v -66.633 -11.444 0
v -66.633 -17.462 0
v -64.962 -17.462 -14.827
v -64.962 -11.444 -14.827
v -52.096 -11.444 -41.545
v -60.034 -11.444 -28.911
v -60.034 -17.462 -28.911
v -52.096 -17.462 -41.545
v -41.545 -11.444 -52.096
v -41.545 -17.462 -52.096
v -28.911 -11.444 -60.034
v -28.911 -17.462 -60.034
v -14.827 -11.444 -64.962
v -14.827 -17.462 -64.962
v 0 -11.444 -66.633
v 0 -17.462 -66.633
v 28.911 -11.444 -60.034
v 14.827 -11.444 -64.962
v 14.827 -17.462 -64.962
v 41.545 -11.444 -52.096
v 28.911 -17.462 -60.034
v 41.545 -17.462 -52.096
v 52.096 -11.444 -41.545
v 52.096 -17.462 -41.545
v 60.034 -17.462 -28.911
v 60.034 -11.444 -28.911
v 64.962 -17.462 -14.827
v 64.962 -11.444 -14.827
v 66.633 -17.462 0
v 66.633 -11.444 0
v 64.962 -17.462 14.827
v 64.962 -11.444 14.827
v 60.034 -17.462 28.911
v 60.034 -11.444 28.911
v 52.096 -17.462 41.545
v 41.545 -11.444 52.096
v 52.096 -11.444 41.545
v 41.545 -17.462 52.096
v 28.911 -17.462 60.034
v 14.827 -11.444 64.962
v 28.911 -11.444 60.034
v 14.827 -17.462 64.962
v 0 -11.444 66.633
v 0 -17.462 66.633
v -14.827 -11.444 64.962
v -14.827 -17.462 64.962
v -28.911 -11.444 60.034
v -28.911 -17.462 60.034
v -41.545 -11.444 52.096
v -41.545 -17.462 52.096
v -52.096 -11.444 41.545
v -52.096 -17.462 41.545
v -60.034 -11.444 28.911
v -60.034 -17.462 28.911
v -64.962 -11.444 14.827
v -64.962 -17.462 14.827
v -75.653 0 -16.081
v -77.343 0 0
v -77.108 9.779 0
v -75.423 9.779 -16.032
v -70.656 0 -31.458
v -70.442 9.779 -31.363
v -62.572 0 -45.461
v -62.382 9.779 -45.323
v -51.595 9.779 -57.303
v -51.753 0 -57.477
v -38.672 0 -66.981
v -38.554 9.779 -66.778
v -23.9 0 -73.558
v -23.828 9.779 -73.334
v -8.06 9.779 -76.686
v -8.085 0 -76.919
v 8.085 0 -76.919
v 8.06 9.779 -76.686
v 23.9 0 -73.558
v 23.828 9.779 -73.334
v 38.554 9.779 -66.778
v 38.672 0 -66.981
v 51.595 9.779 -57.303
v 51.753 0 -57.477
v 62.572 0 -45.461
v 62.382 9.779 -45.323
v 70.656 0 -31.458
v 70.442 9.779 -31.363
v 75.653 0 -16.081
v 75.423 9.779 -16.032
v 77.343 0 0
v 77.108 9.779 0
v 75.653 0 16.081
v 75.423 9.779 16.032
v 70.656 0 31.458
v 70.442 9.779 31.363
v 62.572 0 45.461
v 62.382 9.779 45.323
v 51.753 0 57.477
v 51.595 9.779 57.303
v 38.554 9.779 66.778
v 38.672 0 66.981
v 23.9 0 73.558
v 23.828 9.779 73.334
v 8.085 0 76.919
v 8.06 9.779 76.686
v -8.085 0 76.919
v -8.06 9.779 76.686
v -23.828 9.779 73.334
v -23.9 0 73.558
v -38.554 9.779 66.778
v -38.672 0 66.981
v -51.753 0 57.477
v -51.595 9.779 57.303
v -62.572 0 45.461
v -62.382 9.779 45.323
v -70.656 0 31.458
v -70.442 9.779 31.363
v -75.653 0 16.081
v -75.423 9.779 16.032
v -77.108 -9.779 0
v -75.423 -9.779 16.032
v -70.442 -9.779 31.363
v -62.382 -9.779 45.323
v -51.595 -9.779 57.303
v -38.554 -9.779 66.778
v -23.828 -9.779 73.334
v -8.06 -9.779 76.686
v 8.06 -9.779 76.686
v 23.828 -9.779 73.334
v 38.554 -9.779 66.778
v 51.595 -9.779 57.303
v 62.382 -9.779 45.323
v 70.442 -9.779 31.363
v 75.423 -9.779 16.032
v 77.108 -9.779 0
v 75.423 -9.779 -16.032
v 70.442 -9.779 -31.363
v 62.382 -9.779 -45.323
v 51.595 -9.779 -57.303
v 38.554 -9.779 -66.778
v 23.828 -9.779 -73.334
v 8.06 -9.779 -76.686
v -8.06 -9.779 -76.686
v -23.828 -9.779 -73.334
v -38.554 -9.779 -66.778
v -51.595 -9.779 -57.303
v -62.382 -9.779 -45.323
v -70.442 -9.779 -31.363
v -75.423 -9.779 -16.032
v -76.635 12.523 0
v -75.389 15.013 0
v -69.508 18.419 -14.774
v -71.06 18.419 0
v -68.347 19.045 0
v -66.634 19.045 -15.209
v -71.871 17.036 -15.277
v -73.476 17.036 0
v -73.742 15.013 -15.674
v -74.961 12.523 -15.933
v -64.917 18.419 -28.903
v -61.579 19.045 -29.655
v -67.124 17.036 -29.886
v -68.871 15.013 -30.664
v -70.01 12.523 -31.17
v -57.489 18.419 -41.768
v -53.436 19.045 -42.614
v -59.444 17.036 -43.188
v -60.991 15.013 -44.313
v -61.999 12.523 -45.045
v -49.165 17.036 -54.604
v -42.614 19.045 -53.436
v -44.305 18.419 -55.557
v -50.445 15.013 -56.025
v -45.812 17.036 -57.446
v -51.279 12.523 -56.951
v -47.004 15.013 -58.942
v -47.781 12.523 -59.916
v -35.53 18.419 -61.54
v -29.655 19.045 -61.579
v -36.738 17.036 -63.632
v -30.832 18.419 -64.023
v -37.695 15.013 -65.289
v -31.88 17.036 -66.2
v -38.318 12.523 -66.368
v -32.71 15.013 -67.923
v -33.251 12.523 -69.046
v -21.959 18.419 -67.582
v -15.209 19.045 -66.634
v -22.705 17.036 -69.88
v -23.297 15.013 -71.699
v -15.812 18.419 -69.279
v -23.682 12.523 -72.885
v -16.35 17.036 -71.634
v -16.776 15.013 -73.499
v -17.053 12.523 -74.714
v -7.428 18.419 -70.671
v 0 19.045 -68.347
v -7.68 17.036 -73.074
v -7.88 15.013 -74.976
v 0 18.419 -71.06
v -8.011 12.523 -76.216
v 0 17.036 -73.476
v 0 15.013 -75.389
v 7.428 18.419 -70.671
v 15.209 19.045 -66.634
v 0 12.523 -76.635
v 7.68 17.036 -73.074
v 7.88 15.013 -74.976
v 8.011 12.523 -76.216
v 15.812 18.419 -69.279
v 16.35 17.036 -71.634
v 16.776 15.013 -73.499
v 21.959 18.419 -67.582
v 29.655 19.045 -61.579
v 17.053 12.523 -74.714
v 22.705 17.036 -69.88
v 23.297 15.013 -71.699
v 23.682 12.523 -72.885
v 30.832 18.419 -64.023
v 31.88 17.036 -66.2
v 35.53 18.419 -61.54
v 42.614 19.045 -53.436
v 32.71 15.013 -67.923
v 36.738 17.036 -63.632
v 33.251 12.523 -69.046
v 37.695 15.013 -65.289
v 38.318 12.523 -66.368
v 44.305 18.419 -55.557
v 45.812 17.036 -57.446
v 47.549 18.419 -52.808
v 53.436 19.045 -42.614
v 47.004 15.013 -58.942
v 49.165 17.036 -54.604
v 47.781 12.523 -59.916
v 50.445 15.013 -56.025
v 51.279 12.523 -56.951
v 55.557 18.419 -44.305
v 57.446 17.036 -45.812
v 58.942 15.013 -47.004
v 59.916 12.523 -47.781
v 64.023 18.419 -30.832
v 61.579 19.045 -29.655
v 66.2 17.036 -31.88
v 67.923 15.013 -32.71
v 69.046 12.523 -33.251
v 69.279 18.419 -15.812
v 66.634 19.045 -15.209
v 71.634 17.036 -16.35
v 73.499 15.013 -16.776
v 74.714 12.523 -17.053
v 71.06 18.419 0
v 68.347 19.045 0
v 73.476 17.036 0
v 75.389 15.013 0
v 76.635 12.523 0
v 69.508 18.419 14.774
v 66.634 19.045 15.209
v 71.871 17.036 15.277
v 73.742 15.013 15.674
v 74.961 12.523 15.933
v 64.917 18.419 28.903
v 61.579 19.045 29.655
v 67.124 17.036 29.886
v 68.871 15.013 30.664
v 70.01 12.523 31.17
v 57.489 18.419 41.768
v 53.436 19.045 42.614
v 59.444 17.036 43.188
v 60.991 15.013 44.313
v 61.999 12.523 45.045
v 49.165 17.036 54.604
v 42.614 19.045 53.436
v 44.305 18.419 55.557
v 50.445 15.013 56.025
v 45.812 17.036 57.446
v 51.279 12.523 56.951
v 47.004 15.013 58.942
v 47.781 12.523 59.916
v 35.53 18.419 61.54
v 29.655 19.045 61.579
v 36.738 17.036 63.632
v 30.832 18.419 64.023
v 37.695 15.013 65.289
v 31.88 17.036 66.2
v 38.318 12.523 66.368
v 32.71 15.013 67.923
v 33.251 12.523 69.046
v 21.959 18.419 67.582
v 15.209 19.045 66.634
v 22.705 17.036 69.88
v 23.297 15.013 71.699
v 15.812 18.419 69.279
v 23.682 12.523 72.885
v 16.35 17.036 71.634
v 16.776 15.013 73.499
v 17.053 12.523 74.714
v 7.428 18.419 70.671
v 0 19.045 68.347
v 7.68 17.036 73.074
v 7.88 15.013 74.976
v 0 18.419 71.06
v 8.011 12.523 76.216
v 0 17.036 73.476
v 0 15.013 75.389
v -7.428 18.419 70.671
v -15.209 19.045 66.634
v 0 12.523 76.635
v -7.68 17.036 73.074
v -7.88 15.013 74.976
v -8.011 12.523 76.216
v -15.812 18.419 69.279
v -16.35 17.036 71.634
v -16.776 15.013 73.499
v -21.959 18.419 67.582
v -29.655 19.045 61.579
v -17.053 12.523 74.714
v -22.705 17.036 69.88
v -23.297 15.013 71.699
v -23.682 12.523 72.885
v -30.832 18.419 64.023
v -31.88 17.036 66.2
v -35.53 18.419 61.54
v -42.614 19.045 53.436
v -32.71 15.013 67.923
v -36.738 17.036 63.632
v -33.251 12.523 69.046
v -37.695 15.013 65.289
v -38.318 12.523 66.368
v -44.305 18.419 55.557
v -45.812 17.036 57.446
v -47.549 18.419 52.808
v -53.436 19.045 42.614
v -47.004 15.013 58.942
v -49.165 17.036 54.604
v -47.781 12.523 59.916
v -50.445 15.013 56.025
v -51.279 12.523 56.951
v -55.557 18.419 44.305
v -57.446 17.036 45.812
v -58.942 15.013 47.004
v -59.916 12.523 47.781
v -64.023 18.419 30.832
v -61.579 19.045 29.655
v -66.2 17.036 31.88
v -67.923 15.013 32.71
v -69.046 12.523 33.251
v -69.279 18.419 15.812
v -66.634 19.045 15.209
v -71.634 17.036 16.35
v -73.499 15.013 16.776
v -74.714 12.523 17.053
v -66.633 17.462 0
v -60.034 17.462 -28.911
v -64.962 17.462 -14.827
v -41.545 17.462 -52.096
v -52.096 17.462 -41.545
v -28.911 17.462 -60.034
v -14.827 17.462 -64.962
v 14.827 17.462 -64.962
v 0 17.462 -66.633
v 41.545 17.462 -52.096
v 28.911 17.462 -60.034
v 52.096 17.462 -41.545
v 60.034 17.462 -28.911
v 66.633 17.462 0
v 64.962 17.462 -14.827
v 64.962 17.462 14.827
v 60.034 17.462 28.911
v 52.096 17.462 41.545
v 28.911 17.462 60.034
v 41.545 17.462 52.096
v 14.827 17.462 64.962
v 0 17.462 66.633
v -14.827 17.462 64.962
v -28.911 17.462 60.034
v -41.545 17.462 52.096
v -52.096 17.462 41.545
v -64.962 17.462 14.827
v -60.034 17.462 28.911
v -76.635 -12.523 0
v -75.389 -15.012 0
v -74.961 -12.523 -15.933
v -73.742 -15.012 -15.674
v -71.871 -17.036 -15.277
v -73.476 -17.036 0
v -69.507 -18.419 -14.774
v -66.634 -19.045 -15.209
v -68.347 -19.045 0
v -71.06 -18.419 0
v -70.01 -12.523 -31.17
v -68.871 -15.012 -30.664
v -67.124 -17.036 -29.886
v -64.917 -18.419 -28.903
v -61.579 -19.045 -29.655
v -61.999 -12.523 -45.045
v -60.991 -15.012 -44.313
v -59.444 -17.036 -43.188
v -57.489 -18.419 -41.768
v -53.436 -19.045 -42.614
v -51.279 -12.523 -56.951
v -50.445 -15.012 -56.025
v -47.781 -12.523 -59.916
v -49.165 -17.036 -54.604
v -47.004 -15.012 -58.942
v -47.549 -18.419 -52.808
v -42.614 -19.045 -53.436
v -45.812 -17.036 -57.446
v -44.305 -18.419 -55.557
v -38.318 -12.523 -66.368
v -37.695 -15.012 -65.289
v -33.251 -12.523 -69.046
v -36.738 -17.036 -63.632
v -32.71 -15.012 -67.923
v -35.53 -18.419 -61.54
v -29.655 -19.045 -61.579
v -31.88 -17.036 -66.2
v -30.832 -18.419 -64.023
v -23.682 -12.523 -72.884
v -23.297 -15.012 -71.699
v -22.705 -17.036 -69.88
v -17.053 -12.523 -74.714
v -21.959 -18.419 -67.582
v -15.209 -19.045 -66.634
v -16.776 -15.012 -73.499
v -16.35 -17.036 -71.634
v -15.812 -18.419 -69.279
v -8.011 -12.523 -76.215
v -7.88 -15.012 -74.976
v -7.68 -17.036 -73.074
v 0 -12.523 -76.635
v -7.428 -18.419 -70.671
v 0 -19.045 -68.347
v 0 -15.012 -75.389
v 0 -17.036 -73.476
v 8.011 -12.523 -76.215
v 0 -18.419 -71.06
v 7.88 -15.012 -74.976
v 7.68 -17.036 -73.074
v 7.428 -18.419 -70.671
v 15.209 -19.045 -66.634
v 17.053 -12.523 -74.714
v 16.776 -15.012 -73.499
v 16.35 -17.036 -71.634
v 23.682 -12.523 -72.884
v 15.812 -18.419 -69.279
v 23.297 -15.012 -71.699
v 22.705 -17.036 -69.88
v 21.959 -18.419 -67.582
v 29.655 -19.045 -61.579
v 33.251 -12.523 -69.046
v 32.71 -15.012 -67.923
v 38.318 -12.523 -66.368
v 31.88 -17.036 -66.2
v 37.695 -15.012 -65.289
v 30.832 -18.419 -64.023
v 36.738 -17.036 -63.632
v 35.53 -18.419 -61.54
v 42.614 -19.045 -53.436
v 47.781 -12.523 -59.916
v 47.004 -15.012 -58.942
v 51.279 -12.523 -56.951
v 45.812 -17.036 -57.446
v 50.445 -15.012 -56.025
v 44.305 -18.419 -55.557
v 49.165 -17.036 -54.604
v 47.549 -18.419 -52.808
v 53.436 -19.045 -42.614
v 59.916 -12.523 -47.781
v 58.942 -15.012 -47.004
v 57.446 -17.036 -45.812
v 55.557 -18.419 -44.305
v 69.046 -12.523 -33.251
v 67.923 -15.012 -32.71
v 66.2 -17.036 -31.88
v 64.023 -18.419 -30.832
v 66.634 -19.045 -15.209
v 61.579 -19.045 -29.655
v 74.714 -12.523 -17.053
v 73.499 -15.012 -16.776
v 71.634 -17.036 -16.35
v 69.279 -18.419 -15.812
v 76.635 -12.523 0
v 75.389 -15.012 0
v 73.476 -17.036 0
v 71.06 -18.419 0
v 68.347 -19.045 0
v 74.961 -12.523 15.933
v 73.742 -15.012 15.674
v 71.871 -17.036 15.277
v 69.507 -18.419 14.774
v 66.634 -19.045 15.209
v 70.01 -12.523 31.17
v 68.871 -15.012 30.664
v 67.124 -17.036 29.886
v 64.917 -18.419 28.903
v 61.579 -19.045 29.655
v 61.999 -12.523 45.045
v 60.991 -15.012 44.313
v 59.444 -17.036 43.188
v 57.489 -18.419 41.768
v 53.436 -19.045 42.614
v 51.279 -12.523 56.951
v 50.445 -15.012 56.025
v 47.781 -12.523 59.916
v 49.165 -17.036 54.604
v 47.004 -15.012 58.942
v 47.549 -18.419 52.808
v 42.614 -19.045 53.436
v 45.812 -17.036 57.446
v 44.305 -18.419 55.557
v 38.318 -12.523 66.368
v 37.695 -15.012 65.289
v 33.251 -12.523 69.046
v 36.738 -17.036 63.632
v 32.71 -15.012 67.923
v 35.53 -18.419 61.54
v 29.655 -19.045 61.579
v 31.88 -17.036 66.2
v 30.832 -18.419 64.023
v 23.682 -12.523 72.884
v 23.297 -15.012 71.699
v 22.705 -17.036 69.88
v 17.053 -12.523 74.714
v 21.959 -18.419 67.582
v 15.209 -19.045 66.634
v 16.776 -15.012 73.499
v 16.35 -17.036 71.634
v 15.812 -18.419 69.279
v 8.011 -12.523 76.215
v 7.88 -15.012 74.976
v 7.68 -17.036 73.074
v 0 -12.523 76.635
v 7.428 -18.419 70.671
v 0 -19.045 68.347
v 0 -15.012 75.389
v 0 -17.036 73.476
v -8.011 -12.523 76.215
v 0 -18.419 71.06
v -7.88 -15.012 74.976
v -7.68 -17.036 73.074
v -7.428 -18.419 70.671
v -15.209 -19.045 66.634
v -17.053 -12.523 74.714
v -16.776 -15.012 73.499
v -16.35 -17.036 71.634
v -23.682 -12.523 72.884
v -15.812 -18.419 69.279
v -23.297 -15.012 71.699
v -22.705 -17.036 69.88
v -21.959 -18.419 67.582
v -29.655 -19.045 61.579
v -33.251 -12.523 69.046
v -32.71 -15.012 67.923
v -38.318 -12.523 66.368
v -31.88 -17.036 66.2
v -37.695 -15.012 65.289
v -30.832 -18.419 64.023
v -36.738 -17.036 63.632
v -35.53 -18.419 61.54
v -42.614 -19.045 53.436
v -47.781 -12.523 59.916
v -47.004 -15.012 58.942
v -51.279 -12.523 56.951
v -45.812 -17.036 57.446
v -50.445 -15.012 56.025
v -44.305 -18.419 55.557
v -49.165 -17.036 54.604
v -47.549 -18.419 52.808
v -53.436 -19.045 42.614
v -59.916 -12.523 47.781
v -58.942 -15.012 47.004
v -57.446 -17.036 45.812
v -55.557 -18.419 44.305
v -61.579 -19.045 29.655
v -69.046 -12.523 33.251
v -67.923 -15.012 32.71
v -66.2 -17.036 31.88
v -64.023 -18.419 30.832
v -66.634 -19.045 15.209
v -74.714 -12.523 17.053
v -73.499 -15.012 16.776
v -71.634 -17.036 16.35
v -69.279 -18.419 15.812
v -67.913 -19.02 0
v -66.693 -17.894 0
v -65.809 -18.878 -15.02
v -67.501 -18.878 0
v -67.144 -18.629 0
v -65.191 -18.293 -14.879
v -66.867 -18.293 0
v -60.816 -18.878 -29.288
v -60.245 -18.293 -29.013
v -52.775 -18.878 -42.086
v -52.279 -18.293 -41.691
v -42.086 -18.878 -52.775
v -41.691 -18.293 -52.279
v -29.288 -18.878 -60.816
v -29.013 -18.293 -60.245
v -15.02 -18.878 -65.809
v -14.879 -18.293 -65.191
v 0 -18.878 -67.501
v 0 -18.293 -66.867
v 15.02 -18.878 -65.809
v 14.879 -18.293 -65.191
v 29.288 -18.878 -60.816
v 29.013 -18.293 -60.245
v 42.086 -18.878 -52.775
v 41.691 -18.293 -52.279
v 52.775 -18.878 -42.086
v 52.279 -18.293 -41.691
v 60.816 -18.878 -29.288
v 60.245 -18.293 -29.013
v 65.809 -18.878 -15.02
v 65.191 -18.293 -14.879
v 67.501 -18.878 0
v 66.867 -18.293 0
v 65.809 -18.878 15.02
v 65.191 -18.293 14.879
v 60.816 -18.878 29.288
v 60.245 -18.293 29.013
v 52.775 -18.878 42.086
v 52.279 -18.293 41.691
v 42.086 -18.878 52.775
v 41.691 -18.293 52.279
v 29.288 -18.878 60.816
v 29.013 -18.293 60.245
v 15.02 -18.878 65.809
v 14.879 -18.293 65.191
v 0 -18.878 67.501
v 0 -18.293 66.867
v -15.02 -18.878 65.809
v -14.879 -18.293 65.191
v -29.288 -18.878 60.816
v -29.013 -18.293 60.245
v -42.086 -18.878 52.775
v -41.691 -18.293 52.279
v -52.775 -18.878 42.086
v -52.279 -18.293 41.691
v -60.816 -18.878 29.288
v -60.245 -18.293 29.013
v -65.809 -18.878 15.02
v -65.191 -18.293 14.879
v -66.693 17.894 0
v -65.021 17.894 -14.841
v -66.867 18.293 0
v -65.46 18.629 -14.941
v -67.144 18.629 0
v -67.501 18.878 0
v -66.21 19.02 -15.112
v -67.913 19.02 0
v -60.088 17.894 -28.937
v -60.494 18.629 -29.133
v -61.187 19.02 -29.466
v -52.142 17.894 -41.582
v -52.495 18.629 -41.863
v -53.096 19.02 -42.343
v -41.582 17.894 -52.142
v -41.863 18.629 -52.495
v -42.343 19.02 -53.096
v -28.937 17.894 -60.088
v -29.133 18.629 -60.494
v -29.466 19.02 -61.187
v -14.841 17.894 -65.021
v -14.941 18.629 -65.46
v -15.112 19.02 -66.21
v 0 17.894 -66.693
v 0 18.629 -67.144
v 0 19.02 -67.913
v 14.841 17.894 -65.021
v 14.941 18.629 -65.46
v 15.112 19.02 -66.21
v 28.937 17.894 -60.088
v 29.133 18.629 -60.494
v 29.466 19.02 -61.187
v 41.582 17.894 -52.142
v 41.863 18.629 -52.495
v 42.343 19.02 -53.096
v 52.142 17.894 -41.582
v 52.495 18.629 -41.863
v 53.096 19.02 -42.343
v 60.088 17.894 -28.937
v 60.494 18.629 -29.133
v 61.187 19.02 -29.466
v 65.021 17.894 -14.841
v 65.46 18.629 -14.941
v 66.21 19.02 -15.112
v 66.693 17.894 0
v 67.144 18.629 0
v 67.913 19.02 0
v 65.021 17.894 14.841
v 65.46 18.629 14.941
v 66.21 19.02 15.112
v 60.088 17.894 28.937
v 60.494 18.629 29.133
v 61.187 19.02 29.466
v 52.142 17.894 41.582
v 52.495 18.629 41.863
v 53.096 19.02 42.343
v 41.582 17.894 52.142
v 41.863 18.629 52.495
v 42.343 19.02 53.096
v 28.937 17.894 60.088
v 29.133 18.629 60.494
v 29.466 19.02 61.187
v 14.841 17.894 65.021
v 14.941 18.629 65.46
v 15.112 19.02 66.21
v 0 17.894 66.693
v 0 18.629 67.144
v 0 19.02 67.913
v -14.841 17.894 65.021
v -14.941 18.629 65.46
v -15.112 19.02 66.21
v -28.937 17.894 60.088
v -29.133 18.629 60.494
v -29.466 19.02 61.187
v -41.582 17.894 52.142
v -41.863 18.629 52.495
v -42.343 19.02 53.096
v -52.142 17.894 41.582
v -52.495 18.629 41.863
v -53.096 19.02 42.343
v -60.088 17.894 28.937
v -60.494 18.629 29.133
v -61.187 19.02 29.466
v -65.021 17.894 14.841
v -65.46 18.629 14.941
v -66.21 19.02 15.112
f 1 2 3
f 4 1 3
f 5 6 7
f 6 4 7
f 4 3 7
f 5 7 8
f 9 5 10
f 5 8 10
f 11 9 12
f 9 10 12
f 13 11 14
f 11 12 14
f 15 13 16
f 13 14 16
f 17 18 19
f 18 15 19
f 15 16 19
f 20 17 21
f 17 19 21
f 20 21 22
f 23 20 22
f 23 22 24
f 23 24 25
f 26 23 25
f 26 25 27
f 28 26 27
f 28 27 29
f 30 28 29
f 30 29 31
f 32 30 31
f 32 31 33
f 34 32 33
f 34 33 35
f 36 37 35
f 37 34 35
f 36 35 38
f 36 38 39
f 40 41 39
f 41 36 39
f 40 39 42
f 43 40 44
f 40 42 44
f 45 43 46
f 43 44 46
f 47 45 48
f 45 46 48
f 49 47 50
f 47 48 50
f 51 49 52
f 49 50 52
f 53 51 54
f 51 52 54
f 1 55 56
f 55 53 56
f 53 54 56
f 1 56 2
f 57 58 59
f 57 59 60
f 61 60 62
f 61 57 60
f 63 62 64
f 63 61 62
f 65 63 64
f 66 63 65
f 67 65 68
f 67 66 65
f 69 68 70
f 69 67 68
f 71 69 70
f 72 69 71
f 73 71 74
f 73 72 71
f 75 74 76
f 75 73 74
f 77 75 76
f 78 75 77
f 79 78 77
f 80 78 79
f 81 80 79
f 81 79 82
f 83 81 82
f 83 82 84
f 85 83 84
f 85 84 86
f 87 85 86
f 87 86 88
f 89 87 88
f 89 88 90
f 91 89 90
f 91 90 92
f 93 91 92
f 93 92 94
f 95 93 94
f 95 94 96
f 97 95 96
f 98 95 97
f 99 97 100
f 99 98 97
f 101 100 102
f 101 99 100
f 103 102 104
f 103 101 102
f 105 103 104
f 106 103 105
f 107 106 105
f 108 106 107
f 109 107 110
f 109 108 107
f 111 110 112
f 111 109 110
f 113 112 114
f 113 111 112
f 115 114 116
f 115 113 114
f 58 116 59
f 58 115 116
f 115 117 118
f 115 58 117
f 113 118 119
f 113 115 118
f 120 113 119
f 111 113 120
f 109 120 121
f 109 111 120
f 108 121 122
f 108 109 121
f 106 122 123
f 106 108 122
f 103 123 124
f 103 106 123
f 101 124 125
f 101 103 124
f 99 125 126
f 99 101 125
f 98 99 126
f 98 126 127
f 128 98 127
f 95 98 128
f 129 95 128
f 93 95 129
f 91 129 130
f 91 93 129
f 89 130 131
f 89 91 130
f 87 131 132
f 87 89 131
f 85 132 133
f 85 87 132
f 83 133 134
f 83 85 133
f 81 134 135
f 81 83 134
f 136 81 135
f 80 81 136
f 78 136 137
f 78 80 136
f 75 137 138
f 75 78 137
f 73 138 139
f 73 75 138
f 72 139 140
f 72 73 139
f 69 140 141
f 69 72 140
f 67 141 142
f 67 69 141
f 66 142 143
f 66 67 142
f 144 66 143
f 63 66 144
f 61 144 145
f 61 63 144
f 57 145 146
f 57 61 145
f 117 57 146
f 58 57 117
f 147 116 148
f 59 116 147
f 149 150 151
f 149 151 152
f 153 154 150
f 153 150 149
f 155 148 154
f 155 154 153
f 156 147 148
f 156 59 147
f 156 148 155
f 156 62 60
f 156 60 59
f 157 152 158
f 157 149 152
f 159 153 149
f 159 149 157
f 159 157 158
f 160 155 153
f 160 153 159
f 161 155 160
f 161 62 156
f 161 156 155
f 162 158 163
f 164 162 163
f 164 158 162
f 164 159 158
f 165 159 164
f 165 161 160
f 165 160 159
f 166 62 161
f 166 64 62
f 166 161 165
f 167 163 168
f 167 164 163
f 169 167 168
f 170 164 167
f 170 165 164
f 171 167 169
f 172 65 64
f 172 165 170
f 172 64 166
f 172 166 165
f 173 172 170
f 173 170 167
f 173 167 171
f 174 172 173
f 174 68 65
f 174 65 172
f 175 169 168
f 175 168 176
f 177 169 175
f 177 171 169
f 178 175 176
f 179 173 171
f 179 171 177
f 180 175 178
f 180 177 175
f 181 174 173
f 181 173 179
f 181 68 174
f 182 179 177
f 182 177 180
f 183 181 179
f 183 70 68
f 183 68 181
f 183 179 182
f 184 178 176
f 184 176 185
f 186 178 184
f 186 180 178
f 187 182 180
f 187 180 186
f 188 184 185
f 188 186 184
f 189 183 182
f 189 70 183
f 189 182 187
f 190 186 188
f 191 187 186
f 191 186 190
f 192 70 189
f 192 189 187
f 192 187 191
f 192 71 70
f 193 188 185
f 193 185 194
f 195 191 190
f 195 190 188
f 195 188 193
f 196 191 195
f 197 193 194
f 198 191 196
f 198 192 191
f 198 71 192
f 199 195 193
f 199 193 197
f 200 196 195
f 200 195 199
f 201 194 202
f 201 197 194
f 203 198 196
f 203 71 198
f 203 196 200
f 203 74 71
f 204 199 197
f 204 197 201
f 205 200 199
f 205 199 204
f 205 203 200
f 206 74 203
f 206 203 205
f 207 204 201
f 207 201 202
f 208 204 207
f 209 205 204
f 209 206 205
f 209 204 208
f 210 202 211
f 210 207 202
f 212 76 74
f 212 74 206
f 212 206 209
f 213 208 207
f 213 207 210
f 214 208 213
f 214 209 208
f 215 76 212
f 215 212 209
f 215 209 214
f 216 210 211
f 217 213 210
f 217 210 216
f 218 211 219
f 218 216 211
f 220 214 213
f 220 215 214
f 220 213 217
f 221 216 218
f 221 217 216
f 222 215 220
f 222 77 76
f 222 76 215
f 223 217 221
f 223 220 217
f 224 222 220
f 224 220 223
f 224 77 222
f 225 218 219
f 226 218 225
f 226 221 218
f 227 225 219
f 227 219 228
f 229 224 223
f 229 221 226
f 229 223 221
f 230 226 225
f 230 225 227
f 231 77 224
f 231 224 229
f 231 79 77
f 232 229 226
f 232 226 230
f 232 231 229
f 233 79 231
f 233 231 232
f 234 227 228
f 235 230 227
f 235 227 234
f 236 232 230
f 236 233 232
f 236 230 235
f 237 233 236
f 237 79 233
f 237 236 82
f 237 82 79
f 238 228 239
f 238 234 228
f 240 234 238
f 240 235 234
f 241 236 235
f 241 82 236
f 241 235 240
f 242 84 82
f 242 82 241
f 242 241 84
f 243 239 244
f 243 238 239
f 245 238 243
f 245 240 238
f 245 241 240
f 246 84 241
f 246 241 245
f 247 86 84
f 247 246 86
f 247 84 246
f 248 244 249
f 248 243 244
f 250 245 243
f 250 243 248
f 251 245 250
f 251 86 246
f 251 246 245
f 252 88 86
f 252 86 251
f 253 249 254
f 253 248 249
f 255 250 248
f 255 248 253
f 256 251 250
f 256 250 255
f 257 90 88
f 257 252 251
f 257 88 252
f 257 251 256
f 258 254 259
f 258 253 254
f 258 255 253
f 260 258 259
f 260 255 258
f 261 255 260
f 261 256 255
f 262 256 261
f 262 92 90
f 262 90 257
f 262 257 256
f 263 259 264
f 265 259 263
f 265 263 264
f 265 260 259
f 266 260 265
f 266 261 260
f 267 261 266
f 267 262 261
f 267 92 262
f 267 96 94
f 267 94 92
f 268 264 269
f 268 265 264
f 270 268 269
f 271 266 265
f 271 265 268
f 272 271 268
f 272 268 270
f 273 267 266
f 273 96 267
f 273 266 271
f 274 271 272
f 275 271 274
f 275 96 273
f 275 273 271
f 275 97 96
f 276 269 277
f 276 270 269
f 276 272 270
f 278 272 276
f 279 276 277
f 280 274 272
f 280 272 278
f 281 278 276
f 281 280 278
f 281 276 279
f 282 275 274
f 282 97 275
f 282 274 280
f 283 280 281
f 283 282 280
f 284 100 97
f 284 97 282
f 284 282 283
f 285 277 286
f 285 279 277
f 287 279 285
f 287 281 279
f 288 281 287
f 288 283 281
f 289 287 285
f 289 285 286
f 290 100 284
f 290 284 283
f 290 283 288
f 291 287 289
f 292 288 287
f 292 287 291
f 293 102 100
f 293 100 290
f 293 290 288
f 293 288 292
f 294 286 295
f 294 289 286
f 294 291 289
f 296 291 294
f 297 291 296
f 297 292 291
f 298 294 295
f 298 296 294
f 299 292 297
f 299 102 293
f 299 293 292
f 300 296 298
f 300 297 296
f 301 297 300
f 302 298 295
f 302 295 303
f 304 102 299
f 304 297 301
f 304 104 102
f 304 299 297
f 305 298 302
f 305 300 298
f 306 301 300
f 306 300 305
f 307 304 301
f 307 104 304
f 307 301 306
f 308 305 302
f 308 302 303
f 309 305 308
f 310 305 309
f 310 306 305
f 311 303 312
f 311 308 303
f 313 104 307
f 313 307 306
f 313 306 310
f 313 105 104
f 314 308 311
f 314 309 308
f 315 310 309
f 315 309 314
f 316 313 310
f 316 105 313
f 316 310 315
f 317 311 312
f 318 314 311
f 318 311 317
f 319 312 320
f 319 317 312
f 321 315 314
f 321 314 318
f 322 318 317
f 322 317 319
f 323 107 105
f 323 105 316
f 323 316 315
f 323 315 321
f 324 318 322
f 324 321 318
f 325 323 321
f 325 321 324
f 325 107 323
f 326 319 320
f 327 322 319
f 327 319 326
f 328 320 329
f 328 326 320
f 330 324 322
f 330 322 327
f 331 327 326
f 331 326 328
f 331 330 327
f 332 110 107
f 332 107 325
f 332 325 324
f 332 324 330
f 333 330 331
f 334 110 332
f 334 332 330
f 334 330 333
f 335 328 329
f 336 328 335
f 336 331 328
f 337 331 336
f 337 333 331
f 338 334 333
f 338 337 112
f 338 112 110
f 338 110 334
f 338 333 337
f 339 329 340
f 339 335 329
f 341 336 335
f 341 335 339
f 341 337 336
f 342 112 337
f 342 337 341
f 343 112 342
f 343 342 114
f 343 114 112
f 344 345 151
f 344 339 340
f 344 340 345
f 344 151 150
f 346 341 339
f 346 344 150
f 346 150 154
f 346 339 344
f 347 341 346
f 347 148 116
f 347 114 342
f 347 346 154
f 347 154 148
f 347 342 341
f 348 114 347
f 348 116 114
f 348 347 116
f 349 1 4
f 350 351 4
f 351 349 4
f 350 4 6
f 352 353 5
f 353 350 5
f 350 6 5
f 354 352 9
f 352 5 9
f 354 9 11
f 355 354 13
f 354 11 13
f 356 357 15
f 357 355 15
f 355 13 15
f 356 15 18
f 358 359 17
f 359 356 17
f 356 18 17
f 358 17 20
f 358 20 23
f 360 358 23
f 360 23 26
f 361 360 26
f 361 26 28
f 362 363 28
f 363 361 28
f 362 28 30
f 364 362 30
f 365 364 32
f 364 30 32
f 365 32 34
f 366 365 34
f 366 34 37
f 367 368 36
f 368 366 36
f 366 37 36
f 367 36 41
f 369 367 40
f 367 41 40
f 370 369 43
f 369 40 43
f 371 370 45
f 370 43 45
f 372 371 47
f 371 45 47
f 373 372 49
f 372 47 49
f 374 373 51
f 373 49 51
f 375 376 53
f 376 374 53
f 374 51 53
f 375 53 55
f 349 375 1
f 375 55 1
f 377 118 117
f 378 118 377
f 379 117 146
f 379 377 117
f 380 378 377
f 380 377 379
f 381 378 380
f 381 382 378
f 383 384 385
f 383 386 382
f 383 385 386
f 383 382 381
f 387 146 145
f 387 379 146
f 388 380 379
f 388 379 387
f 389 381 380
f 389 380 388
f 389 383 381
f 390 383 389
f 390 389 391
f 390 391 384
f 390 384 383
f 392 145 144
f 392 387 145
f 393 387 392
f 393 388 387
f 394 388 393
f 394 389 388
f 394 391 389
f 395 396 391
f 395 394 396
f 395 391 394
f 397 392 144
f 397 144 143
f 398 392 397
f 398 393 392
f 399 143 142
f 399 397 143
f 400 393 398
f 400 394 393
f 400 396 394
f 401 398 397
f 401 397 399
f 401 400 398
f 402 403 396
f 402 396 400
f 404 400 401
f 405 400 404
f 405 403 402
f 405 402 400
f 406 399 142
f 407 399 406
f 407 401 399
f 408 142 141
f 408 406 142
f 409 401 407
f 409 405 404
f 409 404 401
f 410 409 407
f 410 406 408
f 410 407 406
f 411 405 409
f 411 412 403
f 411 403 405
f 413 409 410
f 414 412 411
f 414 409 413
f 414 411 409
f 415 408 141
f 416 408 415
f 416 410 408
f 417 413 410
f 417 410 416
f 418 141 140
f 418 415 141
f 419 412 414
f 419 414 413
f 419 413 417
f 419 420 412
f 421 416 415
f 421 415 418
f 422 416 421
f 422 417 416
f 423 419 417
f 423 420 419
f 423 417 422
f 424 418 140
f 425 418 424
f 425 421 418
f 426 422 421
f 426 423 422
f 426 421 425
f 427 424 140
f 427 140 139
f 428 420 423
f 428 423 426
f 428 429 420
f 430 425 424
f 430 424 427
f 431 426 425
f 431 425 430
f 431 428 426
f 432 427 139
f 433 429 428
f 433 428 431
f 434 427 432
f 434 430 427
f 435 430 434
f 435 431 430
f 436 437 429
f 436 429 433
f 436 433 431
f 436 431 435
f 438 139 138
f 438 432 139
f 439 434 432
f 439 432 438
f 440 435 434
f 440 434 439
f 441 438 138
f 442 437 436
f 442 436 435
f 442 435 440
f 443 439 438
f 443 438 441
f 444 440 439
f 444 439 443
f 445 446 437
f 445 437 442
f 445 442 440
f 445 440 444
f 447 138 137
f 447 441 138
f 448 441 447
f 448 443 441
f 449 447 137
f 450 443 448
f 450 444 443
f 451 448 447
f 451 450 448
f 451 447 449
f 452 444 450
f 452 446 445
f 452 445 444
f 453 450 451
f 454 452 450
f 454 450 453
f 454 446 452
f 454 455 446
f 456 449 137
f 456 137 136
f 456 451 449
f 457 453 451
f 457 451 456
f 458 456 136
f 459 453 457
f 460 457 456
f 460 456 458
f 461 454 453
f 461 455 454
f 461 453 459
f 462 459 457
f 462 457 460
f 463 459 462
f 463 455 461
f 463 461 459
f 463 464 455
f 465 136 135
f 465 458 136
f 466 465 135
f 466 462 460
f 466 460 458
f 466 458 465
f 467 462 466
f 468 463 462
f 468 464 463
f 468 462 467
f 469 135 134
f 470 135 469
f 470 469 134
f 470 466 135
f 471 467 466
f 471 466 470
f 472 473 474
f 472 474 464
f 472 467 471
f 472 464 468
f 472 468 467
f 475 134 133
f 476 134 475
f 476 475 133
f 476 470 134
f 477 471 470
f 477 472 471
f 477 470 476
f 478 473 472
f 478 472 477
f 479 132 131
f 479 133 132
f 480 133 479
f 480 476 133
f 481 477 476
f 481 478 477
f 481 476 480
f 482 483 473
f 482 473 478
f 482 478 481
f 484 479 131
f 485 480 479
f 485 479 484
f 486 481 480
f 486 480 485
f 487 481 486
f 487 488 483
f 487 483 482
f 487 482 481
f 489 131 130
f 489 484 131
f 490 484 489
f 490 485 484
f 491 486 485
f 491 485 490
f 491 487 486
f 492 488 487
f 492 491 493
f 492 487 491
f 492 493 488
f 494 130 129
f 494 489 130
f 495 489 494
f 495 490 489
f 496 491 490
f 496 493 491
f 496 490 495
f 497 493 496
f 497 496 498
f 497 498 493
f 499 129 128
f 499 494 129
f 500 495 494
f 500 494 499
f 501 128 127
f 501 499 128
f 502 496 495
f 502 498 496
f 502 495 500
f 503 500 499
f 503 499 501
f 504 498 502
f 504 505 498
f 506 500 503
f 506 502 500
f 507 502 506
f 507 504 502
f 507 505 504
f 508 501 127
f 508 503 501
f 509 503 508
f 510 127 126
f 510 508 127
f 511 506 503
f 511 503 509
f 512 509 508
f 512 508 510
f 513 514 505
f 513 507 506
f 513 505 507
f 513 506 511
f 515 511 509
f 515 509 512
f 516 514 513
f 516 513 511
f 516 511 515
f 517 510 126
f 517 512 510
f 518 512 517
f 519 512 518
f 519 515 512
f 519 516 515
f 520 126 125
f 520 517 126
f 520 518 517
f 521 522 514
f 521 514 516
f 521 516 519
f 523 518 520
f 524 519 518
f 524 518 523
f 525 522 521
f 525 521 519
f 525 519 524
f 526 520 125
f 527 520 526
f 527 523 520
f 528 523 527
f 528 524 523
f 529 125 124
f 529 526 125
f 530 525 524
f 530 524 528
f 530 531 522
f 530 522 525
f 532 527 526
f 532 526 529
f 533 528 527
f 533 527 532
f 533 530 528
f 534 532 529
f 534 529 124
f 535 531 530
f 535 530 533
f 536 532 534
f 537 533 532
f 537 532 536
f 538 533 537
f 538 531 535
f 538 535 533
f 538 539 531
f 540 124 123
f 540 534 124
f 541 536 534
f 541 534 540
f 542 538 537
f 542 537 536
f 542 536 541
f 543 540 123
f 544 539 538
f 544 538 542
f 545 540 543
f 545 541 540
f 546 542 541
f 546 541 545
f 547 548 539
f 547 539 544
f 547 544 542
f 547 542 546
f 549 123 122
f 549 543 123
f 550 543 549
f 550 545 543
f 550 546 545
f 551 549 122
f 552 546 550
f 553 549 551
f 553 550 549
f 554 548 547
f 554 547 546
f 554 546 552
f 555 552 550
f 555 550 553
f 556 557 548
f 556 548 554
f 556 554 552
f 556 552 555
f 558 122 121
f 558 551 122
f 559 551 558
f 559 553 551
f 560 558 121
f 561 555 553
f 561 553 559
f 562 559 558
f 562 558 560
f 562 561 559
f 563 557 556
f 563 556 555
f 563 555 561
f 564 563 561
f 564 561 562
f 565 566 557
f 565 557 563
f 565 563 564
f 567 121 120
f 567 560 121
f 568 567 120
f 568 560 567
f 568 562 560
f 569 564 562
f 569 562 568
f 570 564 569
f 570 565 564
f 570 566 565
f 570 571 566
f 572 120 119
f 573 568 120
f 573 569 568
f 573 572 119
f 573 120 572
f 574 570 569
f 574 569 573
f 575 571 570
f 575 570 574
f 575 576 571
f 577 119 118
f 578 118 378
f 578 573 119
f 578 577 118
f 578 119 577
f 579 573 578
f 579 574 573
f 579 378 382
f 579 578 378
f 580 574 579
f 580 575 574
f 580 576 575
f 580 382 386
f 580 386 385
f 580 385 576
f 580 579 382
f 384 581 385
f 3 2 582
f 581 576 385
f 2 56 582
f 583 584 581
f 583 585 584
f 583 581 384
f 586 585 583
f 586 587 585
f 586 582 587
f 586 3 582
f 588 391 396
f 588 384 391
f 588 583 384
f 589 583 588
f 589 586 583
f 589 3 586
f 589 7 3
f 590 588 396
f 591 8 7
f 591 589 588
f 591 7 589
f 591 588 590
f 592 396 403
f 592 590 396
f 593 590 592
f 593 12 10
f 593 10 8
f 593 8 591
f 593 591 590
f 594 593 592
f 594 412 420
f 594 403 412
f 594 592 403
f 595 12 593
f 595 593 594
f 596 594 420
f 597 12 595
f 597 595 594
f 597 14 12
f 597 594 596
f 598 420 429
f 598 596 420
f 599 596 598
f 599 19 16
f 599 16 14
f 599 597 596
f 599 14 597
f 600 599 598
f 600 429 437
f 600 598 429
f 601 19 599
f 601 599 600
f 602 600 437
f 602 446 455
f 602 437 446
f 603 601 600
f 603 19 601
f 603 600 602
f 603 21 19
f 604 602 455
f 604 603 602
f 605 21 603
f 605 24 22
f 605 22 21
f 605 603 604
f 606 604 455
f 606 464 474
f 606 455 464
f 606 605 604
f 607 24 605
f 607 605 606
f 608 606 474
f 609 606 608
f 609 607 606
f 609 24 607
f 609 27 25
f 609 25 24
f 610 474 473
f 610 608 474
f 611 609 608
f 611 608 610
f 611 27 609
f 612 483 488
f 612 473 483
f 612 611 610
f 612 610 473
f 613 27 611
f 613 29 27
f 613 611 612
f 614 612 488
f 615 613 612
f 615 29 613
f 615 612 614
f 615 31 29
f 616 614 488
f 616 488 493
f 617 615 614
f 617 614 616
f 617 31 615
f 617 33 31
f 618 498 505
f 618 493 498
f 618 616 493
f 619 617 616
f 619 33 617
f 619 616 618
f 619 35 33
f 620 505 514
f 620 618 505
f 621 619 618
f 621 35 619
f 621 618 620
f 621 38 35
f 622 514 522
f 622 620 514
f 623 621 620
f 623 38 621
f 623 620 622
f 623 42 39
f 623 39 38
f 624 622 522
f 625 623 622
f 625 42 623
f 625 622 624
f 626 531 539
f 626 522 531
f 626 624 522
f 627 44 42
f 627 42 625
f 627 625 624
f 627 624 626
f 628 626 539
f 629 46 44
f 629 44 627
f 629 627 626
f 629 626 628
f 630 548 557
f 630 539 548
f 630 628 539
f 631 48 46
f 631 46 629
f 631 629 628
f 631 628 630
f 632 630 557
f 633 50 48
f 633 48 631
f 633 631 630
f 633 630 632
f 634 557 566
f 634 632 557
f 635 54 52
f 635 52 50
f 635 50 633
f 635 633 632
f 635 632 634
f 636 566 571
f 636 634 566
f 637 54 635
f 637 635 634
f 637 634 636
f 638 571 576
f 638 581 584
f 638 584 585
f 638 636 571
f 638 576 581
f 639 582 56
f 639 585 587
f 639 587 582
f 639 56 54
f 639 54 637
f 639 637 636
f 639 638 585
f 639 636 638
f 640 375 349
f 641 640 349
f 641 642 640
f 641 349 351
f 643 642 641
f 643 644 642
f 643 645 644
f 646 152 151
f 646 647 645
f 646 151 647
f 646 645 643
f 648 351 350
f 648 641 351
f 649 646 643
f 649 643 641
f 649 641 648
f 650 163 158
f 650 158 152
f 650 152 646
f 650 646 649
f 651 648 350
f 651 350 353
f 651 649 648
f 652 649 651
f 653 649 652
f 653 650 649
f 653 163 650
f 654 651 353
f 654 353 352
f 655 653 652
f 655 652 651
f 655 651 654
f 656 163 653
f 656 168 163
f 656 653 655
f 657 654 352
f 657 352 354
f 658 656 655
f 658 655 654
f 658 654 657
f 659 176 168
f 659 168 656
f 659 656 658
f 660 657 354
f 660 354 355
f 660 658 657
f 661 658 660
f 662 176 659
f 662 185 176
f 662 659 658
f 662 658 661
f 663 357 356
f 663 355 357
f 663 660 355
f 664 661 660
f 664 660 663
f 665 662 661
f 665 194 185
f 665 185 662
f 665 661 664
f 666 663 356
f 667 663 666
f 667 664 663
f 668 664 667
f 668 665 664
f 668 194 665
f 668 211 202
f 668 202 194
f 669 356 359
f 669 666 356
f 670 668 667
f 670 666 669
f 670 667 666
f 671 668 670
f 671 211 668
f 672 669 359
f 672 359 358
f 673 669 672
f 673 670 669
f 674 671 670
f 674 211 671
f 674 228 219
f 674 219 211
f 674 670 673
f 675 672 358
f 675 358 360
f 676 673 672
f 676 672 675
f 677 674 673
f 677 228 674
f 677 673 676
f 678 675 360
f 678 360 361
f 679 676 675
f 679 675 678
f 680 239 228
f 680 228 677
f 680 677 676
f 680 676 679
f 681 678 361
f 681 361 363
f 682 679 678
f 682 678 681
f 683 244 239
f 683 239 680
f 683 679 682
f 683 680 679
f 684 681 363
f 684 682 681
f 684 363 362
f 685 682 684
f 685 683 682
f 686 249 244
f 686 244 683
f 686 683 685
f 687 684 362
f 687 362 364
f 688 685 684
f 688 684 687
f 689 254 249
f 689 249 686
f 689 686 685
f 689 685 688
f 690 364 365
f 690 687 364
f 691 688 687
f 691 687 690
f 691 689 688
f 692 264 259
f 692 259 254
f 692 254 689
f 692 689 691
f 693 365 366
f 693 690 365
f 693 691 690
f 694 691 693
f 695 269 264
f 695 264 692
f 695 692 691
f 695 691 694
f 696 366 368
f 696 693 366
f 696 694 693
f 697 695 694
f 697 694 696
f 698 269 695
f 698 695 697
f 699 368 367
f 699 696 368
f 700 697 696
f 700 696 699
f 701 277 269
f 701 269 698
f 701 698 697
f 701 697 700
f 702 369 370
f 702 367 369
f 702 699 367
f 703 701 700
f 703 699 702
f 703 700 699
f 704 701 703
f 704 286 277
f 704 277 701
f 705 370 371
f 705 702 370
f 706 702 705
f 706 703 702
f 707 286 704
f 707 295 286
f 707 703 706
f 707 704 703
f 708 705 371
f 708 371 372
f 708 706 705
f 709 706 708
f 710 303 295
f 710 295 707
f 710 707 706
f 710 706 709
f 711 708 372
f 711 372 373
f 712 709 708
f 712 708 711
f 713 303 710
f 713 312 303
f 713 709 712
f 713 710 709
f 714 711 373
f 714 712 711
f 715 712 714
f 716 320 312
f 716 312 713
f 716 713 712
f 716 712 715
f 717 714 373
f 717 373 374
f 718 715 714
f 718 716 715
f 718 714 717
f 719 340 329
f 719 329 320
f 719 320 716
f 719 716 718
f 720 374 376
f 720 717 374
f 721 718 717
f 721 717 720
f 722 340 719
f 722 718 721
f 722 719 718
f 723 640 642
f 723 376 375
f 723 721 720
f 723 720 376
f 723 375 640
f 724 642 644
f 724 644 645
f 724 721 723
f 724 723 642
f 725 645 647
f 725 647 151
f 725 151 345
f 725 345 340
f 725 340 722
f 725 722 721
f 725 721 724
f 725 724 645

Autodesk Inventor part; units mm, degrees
ref_plane "YZ Plane" through (0, 0, 0) normal (1, 0, 0) x (0, 1, 0)
ref_plane "XZ Plane" through (0, 0, 0) normal (0, 1, 0) x (-1, 0, 0)
ref_plane "XY Plane" through (0, 0, 0) normal (0, 0, 1) x (1, 0, 0)
sketch "Sketch1" plane through (0, 0, 0) normal (0, 0, 1) x (1, 0, 0)
  line L0 (-66.6603, -11.4443) -> (-66.6119, -11.4443)
  arc A0 (-68.3474, -19.0449) -> (-66.633, -17.4625) centre (-68.2205, -17.4625) ccw
  arc A1 (-77.1082, -9.779) -> (-68.3474, -19.0449) centre (-67.586, -9.5504) ccw
  line L1 (-77.1082, -9.779) -> (-77.343, 0)
  line L2 (-77.343, 0) -> (-77.1082, 9.779)
  arc A2 (-68.3474, 19.0449) -> (-77.1082, 9.779) centre (-67.586, 9.5504) ccw
  arc A3 (-66.633, 17.4625) -> (-68.3474, 19.0449) centre (-68.2205, 17.4625) ccw
  line L3 (-66.633, 17.4625) -> (-66.633, -17.4625)
  line L4 (0, -29.0182) -> (0, 29.0182) projected
  point P0 (0, 0)
  point P1 (-66.633, 0)
  dimension "d0" = 38.1
  dimension "d1" = 1.5875
  dimension "d2" = 9.525
  dimension "d3" = 19.558
  dimension "d10" = 77.343
revolve "Revolution1" add sketch "Sketch1" angle 360 about axis through (0, -10, 0) along (0, 1, 0)
properties part number "First 09 Wheel_6+375 tread Simple"
